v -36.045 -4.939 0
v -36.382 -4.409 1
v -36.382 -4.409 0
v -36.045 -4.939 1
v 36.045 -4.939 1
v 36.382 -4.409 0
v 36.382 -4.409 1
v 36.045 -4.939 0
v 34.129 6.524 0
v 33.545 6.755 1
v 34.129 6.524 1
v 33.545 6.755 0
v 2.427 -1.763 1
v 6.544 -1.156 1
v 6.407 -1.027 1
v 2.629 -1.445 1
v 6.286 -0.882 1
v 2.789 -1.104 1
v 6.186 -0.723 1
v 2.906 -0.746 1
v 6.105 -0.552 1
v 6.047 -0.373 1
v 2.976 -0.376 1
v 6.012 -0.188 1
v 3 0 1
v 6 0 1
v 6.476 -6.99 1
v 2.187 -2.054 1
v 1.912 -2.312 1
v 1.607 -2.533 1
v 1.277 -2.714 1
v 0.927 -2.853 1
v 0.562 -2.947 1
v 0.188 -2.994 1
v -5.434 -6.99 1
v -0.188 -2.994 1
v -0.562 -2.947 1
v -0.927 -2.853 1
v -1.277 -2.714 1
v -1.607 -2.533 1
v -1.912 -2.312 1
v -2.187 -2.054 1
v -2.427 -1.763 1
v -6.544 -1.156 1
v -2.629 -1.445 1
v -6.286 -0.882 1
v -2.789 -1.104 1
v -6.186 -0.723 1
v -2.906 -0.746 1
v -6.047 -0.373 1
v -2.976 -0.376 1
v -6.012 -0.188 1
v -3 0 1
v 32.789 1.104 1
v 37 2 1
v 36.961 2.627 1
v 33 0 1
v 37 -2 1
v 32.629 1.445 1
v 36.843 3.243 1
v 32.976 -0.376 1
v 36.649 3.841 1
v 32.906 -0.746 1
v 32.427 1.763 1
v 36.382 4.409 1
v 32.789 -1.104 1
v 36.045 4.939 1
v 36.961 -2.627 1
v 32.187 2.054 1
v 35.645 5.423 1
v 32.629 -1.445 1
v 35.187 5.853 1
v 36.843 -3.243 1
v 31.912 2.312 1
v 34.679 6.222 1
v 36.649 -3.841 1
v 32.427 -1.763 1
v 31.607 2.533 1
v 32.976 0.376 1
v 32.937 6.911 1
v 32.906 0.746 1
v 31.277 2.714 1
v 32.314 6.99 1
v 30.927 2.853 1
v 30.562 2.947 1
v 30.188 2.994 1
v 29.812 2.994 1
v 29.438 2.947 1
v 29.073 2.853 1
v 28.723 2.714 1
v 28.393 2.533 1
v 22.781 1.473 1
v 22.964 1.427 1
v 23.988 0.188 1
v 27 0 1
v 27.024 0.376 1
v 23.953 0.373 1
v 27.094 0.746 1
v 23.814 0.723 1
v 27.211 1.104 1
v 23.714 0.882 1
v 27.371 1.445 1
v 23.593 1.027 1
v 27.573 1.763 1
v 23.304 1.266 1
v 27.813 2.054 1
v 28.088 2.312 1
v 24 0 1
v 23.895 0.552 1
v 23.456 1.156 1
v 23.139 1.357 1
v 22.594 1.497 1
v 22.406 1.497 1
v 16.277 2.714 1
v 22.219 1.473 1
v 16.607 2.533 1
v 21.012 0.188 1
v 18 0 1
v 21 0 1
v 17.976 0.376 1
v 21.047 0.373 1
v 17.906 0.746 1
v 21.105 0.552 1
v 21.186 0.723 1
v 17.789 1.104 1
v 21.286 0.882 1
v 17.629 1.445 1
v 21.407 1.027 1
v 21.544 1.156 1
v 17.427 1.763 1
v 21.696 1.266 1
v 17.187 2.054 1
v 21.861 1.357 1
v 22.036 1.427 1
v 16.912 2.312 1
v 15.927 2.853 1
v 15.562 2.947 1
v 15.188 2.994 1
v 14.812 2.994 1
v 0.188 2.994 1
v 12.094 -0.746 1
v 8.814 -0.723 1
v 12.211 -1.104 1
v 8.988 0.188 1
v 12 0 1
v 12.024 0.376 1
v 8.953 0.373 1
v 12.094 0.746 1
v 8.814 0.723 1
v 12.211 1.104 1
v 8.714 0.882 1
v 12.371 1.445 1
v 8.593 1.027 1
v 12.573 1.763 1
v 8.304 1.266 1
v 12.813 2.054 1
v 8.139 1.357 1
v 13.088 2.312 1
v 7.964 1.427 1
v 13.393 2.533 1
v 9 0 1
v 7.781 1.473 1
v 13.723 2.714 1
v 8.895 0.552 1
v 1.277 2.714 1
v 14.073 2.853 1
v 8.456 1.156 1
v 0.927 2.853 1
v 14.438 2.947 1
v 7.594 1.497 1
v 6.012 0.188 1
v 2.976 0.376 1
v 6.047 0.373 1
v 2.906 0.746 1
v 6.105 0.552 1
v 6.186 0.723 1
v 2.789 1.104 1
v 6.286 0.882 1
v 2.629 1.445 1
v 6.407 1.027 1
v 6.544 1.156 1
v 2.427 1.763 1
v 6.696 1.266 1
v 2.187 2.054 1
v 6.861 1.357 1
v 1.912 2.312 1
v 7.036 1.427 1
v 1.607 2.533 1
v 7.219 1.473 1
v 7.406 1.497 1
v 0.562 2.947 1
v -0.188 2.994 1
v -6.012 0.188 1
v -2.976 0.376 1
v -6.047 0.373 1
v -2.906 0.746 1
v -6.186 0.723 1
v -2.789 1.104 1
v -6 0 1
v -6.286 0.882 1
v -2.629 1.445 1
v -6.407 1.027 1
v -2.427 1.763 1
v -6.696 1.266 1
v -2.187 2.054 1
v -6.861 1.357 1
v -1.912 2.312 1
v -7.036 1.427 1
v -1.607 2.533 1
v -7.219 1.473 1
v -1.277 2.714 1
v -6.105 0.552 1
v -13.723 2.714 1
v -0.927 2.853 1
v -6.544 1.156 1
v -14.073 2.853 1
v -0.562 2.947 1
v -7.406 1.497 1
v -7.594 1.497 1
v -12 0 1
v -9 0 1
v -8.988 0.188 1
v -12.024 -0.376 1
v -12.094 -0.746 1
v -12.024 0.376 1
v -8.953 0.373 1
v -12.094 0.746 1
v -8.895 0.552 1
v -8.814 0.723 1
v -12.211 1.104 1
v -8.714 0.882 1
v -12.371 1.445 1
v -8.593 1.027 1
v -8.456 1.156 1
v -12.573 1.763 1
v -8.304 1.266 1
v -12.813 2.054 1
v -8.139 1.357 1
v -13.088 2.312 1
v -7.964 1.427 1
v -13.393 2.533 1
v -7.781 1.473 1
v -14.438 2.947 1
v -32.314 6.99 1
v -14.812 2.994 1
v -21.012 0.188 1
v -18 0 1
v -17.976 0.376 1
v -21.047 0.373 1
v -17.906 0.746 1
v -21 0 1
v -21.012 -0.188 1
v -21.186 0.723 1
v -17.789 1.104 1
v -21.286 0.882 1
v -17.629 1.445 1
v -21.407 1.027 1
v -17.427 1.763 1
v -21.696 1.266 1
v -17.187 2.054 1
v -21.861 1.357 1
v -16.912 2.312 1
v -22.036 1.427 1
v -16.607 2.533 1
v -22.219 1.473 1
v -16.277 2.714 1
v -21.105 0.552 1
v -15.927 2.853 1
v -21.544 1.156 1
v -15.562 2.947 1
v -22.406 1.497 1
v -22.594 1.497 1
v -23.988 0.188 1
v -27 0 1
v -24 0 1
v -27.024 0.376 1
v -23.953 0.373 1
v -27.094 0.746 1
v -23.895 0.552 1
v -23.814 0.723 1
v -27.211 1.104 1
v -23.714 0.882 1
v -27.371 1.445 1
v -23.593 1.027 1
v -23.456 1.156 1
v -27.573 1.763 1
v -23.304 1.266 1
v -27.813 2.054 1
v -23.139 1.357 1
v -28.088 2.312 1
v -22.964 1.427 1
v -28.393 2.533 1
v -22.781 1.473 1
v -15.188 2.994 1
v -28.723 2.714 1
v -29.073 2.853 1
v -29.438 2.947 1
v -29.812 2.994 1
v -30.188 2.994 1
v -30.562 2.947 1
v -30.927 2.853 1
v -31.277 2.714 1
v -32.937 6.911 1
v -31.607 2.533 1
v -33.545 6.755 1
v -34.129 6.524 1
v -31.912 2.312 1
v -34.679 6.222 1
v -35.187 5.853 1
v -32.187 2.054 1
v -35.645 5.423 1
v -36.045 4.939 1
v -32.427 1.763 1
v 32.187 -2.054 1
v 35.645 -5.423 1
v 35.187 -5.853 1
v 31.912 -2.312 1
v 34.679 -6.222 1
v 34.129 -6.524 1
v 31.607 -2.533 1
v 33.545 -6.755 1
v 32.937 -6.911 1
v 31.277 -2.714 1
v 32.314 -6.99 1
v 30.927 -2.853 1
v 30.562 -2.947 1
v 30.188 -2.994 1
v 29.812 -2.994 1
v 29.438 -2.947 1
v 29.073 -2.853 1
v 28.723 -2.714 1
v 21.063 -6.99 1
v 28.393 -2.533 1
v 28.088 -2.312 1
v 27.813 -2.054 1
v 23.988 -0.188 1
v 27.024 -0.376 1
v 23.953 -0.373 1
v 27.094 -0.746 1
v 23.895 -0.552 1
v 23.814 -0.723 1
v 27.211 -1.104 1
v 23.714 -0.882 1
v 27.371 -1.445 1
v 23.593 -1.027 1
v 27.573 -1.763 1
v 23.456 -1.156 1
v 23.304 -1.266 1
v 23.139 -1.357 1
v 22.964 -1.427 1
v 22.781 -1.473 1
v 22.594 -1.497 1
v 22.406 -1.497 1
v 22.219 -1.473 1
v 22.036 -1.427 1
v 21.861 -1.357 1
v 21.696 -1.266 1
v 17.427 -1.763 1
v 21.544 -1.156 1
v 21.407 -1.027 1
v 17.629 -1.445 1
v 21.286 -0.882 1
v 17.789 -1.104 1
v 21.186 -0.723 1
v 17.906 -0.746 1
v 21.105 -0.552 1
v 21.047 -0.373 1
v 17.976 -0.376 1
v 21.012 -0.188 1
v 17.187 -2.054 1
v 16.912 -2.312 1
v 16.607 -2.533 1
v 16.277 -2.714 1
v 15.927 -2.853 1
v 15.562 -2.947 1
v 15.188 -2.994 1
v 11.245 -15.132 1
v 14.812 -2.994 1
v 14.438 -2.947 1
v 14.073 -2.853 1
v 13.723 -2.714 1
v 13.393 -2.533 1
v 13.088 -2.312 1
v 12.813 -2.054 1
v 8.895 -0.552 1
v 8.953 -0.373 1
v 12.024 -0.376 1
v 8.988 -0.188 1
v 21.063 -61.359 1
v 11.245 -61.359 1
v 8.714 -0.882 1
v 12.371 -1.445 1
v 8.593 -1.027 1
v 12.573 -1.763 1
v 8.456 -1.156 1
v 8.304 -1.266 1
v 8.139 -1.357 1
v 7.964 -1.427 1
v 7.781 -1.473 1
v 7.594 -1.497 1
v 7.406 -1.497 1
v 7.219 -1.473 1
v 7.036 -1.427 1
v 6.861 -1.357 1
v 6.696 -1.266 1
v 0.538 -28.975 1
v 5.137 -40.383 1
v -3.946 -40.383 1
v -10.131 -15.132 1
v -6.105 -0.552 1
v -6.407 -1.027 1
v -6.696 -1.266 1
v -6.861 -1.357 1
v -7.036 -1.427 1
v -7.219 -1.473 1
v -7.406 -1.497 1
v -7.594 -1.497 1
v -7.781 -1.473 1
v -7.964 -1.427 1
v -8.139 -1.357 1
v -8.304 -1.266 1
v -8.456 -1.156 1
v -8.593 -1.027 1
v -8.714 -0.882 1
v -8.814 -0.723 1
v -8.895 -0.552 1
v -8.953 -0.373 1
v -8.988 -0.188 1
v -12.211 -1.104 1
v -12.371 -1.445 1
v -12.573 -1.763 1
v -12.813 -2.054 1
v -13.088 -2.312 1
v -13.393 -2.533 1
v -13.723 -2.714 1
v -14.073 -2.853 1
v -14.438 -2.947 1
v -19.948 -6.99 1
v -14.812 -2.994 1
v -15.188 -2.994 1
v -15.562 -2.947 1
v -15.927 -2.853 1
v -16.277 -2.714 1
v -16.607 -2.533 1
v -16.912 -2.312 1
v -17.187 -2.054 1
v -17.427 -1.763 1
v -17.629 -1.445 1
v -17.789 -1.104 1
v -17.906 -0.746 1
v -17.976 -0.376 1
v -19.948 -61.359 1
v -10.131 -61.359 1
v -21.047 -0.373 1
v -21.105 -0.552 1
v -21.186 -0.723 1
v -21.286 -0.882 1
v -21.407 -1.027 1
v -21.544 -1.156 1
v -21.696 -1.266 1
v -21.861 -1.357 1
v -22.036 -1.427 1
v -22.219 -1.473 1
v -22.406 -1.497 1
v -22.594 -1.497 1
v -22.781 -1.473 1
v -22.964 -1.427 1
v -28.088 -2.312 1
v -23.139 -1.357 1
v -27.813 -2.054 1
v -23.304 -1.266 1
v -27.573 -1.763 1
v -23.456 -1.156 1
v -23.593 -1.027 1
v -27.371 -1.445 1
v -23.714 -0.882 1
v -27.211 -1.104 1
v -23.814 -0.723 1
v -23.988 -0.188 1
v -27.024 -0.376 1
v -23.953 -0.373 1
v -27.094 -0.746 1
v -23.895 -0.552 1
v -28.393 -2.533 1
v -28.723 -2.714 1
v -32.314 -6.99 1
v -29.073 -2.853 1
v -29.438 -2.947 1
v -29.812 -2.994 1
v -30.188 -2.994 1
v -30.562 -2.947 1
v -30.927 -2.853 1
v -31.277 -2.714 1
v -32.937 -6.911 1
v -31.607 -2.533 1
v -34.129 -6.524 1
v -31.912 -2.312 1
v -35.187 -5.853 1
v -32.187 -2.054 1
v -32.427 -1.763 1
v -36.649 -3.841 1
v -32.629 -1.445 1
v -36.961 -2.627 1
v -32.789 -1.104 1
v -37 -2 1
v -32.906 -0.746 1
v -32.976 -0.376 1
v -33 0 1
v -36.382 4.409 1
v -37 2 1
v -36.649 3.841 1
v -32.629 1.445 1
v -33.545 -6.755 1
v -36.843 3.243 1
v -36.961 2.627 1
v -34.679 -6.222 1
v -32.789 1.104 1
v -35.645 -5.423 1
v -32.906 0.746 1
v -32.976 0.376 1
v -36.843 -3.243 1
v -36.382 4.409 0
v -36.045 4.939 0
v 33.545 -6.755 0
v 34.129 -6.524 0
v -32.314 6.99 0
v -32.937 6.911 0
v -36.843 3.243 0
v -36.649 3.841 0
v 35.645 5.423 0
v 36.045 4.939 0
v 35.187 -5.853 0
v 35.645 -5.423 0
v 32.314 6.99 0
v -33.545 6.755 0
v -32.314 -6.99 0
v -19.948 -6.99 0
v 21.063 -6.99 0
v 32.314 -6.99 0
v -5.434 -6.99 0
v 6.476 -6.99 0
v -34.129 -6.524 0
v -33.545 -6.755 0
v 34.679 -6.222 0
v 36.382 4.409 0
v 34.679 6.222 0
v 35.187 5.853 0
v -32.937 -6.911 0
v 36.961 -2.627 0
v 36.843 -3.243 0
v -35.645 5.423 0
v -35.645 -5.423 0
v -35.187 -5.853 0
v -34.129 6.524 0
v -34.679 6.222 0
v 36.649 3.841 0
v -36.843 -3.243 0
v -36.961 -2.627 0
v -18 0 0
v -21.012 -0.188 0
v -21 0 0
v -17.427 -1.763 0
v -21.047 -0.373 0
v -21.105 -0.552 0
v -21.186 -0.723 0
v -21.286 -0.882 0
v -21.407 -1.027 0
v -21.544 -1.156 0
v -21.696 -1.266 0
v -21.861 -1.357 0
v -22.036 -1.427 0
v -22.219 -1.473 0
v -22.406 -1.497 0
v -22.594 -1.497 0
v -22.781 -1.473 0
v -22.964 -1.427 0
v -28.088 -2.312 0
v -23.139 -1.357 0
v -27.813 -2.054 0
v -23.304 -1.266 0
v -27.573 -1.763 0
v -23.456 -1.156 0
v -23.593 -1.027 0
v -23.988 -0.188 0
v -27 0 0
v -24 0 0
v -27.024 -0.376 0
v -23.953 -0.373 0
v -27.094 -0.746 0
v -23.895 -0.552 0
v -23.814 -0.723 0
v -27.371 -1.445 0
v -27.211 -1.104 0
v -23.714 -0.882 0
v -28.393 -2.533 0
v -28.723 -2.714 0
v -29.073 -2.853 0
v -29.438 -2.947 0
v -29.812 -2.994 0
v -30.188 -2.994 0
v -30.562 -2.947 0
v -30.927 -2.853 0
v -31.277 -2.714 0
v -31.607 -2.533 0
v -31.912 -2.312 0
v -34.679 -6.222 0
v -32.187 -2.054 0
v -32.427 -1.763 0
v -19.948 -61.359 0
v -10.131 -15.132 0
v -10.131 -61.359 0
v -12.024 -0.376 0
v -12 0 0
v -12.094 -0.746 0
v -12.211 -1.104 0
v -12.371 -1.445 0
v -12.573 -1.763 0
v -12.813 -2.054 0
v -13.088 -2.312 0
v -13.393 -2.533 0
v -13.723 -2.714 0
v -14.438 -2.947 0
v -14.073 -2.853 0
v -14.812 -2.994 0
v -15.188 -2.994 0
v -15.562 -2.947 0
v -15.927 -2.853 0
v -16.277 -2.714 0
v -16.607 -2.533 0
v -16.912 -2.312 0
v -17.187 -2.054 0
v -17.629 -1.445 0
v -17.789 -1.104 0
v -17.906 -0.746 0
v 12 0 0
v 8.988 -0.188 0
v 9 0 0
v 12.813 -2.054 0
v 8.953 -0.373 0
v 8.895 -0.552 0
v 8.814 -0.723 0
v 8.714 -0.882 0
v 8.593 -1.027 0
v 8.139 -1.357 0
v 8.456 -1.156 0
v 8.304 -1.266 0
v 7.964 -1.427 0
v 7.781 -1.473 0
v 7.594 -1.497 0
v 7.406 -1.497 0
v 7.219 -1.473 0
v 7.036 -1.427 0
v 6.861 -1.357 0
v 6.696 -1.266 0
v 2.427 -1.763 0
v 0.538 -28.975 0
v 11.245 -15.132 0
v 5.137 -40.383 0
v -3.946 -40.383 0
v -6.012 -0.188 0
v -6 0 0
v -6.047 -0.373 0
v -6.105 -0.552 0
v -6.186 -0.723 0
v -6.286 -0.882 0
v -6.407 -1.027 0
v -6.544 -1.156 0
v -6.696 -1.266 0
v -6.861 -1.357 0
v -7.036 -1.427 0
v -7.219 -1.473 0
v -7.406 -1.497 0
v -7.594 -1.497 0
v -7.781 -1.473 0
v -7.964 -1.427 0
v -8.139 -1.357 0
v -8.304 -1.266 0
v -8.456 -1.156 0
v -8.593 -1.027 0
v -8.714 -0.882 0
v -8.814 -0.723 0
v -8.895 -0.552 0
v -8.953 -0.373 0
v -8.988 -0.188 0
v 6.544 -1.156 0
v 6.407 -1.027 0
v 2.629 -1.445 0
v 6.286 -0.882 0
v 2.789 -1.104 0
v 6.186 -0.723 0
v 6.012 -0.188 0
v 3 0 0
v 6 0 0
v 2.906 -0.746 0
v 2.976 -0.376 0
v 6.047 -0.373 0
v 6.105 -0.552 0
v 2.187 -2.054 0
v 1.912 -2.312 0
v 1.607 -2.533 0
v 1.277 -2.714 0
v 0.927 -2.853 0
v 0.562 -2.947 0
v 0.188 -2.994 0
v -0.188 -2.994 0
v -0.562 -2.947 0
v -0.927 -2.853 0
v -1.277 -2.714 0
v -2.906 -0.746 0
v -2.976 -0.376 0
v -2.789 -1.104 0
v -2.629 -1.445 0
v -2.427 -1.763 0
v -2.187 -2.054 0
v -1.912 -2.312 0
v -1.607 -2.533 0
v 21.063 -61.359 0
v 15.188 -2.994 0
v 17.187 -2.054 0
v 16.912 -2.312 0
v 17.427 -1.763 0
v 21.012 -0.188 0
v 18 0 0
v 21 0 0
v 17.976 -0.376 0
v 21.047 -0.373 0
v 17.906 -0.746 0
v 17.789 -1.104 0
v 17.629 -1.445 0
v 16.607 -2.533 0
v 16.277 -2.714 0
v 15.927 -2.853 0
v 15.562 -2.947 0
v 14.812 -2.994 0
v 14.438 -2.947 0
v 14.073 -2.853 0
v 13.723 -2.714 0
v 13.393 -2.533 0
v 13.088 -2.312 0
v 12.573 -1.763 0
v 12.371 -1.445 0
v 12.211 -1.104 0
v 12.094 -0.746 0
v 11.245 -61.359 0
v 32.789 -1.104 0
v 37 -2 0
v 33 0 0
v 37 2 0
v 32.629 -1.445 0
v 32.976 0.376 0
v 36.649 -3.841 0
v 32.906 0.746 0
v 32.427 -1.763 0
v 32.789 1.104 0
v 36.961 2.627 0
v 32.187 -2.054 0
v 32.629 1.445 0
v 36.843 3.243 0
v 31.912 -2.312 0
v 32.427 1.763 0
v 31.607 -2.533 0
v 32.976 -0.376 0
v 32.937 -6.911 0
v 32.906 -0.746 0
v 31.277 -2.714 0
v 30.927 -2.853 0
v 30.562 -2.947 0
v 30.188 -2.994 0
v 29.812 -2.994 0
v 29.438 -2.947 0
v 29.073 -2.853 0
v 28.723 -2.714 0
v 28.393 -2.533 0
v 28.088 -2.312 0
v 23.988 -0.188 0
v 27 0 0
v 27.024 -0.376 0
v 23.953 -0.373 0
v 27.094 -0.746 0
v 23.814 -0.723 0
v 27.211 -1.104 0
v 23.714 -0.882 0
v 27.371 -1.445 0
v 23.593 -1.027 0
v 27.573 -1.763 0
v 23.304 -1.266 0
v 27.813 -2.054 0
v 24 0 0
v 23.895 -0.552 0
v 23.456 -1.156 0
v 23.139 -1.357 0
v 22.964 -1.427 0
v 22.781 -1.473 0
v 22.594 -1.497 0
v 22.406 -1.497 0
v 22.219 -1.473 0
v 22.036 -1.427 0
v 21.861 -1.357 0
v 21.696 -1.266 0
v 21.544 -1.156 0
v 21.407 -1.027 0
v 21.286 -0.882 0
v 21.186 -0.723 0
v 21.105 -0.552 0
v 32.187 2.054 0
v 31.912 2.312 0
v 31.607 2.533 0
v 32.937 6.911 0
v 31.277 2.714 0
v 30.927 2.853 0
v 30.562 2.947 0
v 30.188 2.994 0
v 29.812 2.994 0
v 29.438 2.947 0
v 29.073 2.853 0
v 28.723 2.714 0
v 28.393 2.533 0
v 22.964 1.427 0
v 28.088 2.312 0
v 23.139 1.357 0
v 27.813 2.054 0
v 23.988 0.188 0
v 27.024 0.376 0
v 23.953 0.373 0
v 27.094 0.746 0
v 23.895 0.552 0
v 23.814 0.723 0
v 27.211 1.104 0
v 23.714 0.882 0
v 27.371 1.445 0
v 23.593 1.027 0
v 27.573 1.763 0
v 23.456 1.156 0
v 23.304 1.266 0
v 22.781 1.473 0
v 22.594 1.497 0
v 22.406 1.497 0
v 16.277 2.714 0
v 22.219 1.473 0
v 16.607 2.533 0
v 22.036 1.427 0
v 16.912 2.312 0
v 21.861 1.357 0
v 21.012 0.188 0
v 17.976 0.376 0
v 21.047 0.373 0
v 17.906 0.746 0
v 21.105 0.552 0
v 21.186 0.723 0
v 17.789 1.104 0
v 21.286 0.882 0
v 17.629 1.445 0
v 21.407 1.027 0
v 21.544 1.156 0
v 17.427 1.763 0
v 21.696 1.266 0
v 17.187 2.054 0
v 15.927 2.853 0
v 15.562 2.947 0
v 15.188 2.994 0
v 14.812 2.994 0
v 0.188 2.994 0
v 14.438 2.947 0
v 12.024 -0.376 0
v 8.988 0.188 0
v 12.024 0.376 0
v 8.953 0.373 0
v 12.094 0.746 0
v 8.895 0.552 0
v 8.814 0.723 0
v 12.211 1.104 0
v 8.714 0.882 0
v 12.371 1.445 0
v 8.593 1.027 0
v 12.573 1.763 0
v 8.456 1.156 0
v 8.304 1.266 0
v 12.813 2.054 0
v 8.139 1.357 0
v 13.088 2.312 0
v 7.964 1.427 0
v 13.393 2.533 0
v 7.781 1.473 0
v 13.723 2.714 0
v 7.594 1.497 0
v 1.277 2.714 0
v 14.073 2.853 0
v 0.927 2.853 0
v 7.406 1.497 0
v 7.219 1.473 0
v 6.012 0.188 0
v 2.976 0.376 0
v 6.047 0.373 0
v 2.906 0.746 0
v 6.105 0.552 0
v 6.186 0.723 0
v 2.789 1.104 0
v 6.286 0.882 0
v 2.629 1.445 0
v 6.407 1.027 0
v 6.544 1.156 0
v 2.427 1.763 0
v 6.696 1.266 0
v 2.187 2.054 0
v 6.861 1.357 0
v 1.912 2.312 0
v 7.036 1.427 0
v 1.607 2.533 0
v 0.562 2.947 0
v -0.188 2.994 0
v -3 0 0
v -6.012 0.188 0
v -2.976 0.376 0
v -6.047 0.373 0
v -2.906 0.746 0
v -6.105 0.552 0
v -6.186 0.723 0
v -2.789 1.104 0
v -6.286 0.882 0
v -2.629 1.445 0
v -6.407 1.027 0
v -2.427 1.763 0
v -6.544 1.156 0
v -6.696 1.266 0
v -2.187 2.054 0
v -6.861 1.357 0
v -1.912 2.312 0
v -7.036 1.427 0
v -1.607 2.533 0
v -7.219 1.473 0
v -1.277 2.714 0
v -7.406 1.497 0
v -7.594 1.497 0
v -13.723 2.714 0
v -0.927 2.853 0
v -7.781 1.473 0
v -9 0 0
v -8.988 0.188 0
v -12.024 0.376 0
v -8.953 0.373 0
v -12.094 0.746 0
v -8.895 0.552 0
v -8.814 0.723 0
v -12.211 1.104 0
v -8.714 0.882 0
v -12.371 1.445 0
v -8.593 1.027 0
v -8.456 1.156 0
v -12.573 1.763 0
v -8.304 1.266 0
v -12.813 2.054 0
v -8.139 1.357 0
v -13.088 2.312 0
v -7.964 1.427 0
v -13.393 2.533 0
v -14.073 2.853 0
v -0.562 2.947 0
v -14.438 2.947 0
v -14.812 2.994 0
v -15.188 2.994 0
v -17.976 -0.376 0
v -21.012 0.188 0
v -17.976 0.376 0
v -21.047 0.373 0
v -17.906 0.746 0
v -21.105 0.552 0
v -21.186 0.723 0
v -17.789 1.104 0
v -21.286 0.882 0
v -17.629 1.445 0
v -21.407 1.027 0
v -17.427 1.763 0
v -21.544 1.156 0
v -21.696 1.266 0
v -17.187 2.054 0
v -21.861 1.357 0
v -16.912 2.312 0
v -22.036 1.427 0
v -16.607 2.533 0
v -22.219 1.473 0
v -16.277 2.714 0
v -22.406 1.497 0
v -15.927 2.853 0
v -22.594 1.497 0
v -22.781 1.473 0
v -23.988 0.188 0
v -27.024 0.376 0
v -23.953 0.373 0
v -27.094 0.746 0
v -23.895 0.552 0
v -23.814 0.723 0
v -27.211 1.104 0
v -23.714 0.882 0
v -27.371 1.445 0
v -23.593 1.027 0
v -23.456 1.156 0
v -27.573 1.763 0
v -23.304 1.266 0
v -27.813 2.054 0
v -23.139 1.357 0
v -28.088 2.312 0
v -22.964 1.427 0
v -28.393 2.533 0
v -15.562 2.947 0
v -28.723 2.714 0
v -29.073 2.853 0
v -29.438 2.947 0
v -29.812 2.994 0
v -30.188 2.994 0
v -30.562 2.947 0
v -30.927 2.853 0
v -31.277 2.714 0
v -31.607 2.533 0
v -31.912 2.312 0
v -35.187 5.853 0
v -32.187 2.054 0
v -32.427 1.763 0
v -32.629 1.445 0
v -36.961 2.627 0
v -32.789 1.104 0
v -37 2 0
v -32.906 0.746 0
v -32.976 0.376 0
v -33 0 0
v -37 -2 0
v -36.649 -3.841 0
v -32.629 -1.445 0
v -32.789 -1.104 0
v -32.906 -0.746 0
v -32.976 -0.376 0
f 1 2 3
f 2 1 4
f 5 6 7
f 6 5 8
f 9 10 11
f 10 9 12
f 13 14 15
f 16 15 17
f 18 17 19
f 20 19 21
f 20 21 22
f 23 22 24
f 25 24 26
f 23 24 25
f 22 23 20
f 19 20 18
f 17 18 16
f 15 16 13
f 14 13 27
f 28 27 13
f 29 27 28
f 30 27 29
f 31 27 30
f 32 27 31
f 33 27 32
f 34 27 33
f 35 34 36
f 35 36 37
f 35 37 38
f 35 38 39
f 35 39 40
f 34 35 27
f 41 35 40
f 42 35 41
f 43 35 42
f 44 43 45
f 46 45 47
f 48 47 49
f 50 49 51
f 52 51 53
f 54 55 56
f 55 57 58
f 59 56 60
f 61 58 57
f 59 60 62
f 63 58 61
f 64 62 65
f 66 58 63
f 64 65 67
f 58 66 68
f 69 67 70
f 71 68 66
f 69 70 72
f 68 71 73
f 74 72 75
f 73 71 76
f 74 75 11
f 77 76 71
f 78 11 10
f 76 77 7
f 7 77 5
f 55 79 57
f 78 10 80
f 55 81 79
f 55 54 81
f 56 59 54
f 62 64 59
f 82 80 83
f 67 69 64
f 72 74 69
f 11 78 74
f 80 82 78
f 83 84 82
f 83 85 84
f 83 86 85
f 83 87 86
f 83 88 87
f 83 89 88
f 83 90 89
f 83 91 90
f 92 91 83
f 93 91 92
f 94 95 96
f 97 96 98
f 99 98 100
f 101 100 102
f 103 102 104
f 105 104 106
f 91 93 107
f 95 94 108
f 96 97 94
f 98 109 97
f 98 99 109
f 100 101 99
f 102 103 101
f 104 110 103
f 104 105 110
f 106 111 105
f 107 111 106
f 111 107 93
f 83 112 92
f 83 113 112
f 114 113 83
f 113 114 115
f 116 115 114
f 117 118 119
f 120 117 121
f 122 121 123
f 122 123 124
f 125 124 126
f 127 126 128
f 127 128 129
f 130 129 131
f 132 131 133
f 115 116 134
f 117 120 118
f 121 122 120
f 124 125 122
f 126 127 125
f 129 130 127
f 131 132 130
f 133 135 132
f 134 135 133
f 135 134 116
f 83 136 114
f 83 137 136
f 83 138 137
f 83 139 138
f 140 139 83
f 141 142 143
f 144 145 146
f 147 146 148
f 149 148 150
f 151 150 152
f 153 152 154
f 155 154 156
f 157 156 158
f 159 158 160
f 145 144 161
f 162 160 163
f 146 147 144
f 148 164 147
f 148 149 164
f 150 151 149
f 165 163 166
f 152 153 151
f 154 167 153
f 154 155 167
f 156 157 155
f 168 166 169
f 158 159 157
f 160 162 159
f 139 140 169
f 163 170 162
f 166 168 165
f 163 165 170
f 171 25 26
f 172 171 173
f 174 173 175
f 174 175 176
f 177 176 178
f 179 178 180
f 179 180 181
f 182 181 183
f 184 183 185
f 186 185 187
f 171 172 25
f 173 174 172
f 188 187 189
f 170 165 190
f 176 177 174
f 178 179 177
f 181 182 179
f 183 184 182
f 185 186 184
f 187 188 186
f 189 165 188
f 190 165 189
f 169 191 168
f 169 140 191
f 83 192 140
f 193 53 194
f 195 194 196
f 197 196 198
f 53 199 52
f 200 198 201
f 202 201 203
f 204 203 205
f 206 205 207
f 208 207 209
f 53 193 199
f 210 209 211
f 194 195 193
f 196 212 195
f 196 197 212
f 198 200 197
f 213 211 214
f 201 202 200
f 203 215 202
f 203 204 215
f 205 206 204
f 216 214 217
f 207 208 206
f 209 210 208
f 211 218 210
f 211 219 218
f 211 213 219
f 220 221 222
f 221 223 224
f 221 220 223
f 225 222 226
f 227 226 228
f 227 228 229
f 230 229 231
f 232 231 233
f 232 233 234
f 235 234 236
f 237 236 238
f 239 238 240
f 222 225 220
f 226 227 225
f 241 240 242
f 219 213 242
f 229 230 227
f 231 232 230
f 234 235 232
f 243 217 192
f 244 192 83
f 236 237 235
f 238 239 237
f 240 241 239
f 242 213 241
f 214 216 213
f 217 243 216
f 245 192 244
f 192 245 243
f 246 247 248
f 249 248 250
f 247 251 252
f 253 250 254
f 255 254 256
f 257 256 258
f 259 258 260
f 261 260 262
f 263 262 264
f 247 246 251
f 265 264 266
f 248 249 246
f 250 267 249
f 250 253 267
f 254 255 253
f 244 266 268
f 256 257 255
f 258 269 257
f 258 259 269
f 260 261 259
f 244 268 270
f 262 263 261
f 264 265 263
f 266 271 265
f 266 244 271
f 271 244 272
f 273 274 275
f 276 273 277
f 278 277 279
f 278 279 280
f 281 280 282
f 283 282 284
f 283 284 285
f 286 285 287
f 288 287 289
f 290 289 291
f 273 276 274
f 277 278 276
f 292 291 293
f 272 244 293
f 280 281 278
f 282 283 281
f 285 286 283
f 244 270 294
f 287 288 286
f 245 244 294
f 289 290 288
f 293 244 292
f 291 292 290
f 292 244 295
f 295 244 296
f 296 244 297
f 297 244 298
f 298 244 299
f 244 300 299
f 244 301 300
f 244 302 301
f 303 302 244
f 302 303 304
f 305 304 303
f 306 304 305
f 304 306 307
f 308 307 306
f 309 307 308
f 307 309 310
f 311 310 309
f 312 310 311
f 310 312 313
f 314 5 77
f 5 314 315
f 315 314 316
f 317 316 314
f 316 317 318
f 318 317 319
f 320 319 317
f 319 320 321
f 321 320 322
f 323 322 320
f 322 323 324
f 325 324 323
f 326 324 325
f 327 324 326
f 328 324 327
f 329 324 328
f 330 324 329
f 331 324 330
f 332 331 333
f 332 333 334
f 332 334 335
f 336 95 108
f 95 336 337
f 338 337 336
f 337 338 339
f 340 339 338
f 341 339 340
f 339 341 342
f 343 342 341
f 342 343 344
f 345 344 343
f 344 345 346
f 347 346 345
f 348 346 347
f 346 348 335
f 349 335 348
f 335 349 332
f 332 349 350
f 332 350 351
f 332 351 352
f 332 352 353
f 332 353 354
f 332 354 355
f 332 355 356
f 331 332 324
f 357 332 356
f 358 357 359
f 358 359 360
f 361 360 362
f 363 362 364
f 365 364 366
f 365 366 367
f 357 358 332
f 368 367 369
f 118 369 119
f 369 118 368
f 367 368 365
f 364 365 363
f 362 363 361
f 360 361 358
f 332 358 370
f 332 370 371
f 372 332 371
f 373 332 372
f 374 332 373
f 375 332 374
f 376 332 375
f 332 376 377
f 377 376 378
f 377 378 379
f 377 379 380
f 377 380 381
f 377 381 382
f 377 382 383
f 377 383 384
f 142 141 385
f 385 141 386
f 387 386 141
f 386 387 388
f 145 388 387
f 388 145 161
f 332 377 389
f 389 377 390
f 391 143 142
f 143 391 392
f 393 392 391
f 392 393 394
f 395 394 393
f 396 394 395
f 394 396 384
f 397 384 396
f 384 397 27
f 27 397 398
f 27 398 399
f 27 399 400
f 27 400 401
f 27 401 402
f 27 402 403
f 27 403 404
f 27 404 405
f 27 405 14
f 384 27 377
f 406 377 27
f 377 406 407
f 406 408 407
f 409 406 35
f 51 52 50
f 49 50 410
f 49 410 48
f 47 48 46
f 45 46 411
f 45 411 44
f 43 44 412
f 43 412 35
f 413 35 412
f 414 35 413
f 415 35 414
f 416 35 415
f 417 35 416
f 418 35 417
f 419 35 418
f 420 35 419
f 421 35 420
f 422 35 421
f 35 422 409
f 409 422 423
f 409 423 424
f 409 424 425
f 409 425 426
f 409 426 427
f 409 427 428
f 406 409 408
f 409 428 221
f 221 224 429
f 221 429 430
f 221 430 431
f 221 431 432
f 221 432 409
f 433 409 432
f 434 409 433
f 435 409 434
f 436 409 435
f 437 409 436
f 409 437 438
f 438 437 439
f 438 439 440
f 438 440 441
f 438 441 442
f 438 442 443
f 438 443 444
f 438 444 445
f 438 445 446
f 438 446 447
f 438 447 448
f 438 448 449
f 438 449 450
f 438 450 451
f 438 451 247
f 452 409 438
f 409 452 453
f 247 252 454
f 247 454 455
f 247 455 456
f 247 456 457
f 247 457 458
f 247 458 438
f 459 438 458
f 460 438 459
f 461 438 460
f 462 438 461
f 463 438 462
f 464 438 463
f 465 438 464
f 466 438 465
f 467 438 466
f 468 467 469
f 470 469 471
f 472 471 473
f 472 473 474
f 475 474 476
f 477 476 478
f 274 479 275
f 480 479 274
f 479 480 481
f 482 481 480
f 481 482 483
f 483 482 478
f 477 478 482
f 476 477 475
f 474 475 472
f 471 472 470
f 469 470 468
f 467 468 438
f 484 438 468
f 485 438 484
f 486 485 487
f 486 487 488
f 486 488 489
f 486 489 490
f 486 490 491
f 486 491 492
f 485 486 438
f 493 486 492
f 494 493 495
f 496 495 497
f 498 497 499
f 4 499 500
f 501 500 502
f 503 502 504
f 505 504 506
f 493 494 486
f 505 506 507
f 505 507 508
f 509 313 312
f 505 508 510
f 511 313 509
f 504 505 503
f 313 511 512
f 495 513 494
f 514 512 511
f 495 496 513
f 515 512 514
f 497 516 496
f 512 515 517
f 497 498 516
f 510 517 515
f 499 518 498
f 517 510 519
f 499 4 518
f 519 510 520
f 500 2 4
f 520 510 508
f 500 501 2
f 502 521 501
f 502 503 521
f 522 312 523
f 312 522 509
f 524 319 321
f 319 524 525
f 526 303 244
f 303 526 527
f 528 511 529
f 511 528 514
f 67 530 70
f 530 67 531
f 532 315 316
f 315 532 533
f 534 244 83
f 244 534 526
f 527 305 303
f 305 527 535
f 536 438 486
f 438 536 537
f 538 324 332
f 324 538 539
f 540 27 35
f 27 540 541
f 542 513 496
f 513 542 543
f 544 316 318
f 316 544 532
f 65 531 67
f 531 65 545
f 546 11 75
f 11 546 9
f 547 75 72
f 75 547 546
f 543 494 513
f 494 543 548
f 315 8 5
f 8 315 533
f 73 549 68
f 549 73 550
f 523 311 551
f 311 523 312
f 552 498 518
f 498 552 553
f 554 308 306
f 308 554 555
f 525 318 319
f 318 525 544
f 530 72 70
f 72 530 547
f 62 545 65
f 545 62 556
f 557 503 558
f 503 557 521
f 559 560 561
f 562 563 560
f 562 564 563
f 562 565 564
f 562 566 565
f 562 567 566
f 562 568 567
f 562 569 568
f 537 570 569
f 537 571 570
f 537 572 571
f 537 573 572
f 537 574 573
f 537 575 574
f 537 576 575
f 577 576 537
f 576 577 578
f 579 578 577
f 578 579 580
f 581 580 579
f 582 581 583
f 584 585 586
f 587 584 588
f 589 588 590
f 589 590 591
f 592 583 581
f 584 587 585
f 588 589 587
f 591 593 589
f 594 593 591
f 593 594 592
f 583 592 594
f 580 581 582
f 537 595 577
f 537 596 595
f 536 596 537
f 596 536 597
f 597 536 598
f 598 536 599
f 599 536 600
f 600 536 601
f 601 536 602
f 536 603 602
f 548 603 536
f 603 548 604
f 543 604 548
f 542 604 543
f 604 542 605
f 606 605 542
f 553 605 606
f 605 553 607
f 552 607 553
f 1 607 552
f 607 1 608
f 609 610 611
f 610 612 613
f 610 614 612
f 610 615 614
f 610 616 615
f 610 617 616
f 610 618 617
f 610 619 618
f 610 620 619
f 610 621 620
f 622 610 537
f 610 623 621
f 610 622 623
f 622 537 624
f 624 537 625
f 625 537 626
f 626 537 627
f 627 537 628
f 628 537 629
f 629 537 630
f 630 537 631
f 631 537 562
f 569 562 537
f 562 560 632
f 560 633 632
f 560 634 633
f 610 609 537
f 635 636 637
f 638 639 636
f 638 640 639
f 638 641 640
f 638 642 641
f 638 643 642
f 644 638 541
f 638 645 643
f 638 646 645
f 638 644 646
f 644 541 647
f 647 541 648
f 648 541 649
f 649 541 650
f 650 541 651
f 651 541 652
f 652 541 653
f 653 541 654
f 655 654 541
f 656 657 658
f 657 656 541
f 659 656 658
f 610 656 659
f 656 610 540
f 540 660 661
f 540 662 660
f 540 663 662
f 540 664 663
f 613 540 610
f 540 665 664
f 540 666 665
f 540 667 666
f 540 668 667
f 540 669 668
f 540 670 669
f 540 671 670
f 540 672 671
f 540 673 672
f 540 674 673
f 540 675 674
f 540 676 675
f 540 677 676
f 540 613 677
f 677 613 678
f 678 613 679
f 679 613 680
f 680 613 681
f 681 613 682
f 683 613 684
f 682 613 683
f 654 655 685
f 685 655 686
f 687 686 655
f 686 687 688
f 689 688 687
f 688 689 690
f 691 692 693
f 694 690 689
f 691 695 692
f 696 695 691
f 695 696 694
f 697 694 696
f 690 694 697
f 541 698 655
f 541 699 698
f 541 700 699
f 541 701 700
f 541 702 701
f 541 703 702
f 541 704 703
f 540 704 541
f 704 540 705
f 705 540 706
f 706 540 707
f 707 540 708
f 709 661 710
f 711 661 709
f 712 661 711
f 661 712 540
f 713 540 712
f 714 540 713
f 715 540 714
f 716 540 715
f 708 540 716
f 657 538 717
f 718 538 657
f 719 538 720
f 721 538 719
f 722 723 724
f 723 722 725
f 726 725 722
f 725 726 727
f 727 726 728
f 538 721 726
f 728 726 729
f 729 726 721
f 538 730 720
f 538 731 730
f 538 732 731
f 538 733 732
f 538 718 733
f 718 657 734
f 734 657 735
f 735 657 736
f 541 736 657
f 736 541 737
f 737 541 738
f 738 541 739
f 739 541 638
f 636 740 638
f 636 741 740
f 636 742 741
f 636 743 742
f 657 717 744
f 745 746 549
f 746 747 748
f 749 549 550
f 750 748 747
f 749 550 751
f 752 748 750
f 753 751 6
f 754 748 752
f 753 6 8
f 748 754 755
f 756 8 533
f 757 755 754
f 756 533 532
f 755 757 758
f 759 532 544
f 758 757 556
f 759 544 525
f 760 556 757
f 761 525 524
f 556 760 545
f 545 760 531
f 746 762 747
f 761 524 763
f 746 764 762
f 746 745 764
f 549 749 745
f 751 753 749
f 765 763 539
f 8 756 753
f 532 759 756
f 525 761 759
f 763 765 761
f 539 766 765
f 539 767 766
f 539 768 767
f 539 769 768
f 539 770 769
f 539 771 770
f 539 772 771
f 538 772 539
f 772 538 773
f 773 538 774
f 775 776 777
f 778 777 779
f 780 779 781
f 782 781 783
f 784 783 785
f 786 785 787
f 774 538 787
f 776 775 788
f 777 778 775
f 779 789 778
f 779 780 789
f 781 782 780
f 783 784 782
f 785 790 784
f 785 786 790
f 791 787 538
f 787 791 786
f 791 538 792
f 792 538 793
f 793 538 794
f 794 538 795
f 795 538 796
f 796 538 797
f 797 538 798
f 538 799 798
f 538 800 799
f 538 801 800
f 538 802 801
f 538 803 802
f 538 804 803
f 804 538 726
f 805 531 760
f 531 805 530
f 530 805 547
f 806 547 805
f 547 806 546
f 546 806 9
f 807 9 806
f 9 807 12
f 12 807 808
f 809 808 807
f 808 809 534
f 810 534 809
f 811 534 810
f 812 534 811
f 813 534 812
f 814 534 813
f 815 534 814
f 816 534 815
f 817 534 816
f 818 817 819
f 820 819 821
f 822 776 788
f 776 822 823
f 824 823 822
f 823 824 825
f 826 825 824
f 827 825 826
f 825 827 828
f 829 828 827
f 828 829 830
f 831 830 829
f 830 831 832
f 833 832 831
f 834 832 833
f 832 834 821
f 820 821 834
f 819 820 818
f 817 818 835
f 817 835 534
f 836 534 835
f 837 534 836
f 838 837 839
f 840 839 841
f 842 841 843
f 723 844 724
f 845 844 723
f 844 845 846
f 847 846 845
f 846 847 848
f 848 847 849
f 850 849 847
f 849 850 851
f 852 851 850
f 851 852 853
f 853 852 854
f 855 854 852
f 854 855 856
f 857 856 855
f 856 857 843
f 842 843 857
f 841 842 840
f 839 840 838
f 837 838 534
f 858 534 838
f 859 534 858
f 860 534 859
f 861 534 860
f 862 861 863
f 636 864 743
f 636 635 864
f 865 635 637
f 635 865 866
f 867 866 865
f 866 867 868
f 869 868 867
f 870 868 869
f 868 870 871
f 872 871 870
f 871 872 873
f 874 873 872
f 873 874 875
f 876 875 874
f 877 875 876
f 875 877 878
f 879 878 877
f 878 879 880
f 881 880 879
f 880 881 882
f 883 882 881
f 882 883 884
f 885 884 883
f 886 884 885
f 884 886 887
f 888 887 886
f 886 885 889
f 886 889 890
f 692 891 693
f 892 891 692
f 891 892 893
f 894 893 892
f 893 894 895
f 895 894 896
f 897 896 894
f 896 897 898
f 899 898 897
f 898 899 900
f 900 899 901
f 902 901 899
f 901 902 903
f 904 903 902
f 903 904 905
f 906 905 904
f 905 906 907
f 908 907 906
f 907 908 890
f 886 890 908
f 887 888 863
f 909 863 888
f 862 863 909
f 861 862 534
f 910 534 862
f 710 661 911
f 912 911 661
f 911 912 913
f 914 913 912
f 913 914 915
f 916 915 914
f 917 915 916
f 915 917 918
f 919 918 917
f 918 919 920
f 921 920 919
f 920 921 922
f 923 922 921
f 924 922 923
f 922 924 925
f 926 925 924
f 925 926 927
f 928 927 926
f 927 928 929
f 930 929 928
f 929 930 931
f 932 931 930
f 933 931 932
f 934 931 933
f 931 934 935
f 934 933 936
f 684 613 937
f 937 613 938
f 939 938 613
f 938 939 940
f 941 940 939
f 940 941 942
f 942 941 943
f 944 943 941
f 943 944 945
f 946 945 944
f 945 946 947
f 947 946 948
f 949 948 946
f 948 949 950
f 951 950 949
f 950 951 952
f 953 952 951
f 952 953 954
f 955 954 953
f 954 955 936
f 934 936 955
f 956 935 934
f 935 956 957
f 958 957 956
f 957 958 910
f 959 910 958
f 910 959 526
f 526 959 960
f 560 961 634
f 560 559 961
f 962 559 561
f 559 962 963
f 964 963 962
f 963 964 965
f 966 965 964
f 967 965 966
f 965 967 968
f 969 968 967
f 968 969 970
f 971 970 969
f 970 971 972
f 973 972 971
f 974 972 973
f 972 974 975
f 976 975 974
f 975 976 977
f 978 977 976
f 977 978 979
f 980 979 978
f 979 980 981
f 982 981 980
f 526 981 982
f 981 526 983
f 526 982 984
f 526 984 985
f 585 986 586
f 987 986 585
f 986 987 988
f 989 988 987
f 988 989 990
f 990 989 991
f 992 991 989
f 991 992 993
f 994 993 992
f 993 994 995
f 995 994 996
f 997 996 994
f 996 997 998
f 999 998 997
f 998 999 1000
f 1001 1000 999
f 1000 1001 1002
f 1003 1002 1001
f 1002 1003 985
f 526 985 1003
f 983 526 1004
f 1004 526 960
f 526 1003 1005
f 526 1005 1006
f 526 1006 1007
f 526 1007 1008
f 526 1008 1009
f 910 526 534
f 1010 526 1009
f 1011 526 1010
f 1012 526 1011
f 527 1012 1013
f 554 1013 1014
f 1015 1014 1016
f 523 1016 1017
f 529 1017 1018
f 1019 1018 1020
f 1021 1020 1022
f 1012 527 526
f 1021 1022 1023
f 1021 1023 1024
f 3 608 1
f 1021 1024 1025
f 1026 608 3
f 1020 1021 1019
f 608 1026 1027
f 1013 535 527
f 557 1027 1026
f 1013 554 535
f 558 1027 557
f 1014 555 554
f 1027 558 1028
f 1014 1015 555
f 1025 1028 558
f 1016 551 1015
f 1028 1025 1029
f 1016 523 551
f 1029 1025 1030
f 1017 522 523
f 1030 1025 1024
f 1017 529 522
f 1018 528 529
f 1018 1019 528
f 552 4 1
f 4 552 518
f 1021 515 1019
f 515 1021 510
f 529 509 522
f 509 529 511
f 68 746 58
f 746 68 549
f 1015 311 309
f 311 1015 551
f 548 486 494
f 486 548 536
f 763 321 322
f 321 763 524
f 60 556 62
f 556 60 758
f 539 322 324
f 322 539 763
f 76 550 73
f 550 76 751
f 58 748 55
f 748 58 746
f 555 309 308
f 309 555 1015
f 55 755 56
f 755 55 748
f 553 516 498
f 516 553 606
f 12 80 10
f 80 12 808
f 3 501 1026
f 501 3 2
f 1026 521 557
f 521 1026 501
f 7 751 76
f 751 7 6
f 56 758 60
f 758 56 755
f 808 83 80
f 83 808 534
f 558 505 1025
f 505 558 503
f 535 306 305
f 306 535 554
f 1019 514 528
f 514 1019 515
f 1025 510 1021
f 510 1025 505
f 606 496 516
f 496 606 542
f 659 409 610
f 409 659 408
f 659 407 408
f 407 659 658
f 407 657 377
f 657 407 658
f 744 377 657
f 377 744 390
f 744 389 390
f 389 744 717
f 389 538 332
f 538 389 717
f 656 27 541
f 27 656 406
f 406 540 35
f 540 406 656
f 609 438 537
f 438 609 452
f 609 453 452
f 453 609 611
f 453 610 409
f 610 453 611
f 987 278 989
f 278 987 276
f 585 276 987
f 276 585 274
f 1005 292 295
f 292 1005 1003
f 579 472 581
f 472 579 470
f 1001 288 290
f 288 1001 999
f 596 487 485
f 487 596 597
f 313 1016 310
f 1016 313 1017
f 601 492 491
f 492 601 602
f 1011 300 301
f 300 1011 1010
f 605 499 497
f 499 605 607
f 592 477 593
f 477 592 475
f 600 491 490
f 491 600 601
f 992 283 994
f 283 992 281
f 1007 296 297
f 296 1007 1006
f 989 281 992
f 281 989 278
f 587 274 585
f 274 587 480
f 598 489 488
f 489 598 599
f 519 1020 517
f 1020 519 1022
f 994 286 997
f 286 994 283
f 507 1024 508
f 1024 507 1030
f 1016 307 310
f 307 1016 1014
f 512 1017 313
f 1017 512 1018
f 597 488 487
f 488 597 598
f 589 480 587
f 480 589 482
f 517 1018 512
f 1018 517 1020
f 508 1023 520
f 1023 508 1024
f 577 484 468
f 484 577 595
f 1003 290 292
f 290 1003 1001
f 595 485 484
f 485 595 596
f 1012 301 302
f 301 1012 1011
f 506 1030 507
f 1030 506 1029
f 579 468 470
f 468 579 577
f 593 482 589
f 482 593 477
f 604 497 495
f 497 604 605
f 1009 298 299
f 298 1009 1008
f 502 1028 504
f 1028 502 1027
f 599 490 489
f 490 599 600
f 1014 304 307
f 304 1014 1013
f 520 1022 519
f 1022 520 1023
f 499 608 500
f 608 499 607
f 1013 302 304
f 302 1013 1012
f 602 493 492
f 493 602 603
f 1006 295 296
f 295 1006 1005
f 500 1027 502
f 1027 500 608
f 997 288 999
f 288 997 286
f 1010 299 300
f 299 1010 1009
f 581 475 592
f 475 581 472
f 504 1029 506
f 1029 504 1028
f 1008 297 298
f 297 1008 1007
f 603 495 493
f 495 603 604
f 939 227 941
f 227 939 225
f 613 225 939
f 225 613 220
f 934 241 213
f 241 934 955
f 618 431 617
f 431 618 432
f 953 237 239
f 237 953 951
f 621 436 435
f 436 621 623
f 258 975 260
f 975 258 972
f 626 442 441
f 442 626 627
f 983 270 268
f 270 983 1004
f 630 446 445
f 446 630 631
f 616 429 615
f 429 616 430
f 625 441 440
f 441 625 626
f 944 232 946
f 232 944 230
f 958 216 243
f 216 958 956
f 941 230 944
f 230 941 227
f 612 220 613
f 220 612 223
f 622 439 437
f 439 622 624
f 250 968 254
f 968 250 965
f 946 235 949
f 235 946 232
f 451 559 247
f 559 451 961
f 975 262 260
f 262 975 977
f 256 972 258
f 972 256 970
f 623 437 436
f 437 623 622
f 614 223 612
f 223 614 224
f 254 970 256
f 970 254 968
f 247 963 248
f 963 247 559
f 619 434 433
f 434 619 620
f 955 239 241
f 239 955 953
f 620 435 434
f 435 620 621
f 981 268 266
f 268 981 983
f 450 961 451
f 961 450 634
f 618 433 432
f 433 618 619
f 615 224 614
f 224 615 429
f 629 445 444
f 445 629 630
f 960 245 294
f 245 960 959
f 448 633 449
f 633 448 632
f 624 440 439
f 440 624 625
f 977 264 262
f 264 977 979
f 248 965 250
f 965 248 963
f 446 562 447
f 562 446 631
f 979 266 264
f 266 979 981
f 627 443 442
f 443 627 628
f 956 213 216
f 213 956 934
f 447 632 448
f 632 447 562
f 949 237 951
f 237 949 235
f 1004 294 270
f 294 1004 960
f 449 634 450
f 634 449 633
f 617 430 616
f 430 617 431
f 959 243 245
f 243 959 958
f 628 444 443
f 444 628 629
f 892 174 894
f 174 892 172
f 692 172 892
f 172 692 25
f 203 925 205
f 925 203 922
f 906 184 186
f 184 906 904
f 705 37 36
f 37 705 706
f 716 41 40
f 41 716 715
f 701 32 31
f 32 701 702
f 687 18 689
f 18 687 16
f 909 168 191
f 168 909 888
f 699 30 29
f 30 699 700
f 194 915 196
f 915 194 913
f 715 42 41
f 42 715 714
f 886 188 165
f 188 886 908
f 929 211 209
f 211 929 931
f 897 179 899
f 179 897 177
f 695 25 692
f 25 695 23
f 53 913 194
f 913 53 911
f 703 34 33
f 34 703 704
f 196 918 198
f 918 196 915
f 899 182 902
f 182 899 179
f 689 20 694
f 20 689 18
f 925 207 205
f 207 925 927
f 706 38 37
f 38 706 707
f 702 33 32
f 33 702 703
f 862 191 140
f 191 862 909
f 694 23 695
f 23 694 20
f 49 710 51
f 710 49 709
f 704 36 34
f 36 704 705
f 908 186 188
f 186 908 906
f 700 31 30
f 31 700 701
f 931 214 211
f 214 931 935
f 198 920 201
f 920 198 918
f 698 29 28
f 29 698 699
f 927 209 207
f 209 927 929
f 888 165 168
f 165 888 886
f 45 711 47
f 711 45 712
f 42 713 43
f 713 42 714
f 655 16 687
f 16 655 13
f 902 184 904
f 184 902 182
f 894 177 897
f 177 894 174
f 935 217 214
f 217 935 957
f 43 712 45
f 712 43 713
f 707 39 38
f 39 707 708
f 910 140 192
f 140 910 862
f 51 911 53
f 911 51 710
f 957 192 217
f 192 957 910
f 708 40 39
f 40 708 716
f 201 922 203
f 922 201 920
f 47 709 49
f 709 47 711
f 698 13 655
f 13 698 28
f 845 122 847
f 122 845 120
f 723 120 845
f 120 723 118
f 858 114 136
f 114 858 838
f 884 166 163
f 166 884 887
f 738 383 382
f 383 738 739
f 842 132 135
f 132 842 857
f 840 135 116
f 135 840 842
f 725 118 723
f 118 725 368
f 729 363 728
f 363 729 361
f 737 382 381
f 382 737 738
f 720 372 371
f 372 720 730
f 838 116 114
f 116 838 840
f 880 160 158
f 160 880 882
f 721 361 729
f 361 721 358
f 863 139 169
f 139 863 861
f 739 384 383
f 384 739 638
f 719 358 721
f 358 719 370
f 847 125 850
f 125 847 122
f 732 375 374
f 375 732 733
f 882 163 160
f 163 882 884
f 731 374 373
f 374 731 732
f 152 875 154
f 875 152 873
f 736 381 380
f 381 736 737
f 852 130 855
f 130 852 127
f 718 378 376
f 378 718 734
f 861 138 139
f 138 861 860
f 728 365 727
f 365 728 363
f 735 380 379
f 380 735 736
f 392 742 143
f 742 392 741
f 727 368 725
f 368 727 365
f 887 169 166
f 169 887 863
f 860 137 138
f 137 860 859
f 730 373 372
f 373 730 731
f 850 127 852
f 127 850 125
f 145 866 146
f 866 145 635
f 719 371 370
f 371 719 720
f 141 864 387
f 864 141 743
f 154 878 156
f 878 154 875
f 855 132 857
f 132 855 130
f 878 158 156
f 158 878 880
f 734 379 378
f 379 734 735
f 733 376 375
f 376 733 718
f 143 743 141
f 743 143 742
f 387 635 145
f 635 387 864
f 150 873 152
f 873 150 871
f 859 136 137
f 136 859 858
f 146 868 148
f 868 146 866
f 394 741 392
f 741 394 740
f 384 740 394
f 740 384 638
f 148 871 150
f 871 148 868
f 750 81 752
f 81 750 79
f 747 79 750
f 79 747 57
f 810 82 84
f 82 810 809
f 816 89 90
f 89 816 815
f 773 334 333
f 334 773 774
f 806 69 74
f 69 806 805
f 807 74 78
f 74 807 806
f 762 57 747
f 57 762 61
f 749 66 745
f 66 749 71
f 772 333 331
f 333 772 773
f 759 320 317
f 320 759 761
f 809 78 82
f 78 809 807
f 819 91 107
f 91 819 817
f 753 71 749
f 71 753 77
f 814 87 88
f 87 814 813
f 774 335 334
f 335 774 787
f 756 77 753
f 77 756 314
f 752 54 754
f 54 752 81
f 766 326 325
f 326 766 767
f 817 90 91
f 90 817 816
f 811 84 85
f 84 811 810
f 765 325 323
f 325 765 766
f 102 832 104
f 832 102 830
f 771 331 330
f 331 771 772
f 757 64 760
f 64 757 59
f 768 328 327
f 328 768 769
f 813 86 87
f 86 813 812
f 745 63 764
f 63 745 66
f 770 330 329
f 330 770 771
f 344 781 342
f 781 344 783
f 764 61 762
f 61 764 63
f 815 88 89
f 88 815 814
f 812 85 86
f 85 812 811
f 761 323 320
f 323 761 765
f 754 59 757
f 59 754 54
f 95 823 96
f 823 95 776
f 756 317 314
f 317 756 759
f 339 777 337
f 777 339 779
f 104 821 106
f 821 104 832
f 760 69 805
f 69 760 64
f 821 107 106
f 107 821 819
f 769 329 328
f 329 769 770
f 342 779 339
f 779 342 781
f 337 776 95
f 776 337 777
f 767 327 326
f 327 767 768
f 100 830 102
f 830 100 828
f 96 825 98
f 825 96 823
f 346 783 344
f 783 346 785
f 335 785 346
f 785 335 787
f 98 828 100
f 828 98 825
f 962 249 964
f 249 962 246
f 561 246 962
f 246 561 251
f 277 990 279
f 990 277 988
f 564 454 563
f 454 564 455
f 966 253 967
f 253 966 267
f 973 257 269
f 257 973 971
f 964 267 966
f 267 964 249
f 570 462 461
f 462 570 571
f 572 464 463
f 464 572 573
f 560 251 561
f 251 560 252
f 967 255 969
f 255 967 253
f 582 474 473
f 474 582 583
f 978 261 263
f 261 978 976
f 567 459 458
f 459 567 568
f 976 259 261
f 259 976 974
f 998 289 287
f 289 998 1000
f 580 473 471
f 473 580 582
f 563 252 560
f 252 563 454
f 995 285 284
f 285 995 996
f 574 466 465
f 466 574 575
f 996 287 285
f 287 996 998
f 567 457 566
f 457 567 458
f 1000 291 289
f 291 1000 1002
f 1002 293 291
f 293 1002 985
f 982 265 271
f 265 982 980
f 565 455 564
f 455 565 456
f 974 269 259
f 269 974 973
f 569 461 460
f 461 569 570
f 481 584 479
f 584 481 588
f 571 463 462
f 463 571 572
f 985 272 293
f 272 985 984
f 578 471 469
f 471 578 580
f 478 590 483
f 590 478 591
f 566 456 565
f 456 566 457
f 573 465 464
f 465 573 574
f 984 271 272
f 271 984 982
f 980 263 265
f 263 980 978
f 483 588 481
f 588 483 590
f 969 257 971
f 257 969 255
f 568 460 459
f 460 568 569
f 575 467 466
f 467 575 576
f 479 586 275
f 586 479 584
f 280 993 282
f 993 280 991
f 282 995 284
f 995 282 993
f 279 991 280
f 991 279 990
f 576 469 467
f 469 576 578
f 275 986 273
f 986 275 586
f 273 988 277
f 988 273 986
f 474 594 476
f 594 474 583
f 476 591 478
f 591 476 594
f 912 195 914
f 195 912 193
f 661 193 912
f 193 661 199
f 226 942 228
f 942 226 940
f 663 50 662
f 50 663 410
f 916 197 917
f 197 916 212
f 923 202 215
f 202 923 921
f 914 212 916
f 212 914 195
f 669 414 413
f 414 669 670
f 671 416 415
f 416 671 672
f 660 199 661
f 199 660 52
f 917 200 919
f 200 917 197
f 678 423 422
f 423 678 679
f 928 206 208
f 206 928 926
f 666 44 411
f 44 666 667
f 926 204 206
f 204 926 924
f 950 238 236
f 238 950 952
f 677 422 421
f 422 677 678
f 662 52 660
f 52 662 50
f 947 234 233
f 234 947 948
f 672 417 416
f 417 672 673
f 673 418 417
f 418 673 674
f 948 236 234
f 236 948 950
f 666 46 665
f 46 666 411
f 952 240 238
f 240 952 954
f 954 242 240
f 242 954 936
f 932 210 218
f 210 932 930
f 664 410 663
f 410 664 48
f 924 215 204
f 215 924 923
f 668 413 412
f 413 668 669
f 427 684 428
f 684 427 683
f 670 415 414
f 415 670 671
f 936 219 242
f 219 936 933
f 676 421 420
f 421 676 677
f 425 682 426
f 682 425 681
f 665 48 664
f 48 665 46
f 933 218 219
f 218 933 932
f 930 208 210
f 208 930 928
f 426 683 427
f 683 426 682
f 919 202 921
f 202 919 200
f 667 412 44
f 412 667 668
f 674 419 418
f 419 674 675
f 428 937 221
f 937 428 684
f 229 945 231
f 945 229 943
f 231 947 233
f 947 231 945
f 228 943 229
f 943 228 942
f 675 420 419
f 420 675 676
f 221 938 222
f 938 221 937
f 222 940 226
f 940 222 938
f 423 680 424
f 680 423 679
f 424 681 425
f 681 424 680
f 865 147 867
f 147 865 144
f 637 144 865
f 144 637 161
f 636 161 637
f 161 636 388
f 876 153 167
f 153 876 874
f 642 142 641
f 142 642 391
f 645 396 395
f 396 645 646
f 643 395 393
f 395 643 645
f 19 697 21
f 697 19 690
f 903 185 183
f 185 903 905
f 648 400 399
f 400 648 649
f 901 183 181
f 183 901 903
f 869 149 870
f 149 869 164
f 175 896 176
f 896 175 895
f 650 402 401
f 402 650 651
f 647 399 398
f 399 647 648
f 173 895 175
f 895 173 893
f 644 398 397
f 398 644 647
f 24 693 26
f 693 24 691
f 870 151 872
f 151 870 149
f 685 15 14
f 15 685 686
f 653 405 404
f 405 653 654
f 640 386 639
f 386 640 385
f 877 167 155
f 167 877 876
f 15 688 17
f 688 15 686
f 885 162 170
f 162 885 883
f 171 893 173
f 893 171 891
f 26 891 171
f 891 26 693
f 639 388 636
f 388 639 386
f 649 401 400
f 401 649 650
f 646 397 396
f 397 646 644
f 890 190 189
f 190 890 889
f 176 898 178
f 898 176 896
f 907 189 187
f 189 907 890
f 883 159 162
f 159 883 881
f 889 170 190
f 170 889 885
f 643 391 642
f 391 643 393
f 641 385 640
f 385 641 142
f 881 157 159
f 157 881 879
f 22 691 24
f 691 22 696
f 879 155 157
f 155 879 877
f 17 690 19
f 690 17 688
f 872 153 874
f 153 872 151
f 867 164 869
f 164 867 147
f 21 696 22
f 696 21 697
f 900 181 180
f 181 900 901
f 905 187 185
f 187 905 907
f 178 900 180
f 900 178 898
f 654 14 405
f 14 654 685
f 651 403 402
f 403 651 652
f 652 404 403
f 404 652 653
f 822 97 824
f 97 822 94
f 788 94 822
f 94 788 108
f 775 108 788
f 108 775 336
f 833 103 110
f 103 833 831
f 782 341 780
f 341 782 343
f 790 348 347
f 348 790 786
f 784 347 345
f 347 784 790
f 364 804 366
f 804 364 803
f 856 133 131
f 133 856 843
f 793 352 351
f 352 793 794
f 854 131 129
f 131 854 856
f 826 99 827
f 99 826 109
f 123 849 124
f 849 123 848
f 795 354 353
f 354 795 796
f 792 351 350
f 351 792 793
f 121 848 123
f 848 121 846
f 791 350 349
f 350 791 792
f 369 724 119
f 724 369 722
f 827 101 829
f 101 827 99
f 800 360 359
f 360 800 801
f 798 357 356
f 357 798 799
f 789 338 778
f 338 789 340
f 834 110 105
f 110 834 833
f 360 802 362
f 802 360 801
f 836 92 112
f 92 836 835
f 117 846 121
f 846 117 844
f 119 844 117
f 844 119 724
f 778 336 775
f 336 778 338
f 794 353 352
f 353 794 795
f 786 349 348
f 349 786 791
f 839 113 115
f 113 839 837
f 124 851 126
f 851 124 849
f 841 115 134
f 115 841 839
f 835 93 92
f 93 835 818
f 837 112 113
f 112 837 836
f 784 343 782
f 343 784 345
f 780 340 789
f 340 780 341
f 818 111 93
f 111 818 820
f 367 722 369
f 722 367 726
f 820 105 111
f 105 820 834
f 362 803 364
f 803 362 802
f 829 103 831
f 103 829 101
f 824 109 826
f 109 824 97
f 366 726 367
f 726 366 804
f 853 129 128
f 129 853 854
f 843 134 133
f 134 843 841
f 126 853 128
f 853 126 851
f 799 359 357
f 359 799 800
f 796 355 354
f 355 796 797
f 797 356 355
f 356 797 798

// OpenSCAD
$fn = 50;


difference() {
	union() {
		hull() {
			translate(v = [-32.0000000000, 2.0000000000, 0]) {
				cylinder(h = 1, r = 5);
			}
			translate(v = [32.0000000000, 2.0000000000, 0]) {
				cylinder(h = 1, r = 5);
			}
			translate(v = [-32.0000000000, -2.0000000000, 0]) {
				cylinder(h = 1, r = 5);
			}
			translate(v = [32.0000000000, -2.0000000000, 0]) {
				cylinder(h = 1, r = 5);
			}
		}
		translate(v = [0, -5, 0]) {
			linear_extrude(height = 1) {
				text(font = "DejaVu Sans Mono:style=Bold", halign = "center", size = 57.0000000000, text = "M", valign = "top");
			}
		}
	}
	union() {
		translate(v = [-30.0000000000, 0.0000000000, 0]) {
			translate(v = [0, 0, -100]) {
				cylinder(h = 200, r = 3.0000000000);
			}
		}
		translate(v = [-15.0000000000, 0.0000000000, 0]) {
			translate(v = [0, 0, -100]) {
				cylinder(h = 200, r = 3.0000000000);
			}
		}
		translate(v = [0, 0, -100]) {
			cylinder(h = 200, r = 3.0000000000);
		}
		translate(v = [15.0000000000, 0.0000000000, 0]) {
			translate(v = [0, 0, -100]) {
				cylinder(h = 200, r = 3.0000000000);
			}
		}
		translate(v = [30.0000000000, 0.0000000000, 0]) {
			translate(v = [0, 0, -100]) {
				cylinder(h = 200, r = 3.0000000000);
			}
		}
		translate(v = [-30.0000000000, 0.0000000000, 0]) {
			translate(v = [0, 0, -100]) {
				cylinder(h = 200, r = 1.5000000000);
			}
		}
		translate(v = [-22.5000000000, 0.0000000000, 0]) {
			translate(v = [0, 0, -100]) {
				cylinder(h = 200, r = 1.5000000000);
			}
		}
		translate(v = [-15.0000000000, 0.0000000000, 0]) {
			translate(v = [0, 0, -100]) {
				cylinder(h = 200, r = 1.5000000000);
			}
		}
		translate(v = [-7.5000000000, 0.0000000000, 0]) {
			translate(v = [0, 0, -100]) {
				cylinder(h = 200, r = 1.5000000000);
			}
		}
		translate(v = [0, 0, -100]) {
			cylinder(h = 200, r = 1.5000000000);
		}
		translate(v = [7.5000000000, 0.0000000000, 0]) {
			translate(v = [0, 0, -100]) {
				cylinder(h = 200, r = 1.5000000000);
			}
		}
		translate(v = [15.0000000000, 0.0000000000, 0]) {
			translate(v = [0, 0, -100]) {
				cylinder(h = 200, r = 1.5000000000);
			}
		}
		translate(v = [22.5000000000, 0.0000000000, 0]) {
			translate(v = [0, 0, -100]) {
				cylinder(h = 200, r = 1.5000000000);
			}
		}
		translate(v = [30.0000000000, 0.0000000000, 0]) {
			translate(v = [0, 0, -100]) {
				cylinder(h = 200, r = 1.5000000000);
			}
		}
	}
}
